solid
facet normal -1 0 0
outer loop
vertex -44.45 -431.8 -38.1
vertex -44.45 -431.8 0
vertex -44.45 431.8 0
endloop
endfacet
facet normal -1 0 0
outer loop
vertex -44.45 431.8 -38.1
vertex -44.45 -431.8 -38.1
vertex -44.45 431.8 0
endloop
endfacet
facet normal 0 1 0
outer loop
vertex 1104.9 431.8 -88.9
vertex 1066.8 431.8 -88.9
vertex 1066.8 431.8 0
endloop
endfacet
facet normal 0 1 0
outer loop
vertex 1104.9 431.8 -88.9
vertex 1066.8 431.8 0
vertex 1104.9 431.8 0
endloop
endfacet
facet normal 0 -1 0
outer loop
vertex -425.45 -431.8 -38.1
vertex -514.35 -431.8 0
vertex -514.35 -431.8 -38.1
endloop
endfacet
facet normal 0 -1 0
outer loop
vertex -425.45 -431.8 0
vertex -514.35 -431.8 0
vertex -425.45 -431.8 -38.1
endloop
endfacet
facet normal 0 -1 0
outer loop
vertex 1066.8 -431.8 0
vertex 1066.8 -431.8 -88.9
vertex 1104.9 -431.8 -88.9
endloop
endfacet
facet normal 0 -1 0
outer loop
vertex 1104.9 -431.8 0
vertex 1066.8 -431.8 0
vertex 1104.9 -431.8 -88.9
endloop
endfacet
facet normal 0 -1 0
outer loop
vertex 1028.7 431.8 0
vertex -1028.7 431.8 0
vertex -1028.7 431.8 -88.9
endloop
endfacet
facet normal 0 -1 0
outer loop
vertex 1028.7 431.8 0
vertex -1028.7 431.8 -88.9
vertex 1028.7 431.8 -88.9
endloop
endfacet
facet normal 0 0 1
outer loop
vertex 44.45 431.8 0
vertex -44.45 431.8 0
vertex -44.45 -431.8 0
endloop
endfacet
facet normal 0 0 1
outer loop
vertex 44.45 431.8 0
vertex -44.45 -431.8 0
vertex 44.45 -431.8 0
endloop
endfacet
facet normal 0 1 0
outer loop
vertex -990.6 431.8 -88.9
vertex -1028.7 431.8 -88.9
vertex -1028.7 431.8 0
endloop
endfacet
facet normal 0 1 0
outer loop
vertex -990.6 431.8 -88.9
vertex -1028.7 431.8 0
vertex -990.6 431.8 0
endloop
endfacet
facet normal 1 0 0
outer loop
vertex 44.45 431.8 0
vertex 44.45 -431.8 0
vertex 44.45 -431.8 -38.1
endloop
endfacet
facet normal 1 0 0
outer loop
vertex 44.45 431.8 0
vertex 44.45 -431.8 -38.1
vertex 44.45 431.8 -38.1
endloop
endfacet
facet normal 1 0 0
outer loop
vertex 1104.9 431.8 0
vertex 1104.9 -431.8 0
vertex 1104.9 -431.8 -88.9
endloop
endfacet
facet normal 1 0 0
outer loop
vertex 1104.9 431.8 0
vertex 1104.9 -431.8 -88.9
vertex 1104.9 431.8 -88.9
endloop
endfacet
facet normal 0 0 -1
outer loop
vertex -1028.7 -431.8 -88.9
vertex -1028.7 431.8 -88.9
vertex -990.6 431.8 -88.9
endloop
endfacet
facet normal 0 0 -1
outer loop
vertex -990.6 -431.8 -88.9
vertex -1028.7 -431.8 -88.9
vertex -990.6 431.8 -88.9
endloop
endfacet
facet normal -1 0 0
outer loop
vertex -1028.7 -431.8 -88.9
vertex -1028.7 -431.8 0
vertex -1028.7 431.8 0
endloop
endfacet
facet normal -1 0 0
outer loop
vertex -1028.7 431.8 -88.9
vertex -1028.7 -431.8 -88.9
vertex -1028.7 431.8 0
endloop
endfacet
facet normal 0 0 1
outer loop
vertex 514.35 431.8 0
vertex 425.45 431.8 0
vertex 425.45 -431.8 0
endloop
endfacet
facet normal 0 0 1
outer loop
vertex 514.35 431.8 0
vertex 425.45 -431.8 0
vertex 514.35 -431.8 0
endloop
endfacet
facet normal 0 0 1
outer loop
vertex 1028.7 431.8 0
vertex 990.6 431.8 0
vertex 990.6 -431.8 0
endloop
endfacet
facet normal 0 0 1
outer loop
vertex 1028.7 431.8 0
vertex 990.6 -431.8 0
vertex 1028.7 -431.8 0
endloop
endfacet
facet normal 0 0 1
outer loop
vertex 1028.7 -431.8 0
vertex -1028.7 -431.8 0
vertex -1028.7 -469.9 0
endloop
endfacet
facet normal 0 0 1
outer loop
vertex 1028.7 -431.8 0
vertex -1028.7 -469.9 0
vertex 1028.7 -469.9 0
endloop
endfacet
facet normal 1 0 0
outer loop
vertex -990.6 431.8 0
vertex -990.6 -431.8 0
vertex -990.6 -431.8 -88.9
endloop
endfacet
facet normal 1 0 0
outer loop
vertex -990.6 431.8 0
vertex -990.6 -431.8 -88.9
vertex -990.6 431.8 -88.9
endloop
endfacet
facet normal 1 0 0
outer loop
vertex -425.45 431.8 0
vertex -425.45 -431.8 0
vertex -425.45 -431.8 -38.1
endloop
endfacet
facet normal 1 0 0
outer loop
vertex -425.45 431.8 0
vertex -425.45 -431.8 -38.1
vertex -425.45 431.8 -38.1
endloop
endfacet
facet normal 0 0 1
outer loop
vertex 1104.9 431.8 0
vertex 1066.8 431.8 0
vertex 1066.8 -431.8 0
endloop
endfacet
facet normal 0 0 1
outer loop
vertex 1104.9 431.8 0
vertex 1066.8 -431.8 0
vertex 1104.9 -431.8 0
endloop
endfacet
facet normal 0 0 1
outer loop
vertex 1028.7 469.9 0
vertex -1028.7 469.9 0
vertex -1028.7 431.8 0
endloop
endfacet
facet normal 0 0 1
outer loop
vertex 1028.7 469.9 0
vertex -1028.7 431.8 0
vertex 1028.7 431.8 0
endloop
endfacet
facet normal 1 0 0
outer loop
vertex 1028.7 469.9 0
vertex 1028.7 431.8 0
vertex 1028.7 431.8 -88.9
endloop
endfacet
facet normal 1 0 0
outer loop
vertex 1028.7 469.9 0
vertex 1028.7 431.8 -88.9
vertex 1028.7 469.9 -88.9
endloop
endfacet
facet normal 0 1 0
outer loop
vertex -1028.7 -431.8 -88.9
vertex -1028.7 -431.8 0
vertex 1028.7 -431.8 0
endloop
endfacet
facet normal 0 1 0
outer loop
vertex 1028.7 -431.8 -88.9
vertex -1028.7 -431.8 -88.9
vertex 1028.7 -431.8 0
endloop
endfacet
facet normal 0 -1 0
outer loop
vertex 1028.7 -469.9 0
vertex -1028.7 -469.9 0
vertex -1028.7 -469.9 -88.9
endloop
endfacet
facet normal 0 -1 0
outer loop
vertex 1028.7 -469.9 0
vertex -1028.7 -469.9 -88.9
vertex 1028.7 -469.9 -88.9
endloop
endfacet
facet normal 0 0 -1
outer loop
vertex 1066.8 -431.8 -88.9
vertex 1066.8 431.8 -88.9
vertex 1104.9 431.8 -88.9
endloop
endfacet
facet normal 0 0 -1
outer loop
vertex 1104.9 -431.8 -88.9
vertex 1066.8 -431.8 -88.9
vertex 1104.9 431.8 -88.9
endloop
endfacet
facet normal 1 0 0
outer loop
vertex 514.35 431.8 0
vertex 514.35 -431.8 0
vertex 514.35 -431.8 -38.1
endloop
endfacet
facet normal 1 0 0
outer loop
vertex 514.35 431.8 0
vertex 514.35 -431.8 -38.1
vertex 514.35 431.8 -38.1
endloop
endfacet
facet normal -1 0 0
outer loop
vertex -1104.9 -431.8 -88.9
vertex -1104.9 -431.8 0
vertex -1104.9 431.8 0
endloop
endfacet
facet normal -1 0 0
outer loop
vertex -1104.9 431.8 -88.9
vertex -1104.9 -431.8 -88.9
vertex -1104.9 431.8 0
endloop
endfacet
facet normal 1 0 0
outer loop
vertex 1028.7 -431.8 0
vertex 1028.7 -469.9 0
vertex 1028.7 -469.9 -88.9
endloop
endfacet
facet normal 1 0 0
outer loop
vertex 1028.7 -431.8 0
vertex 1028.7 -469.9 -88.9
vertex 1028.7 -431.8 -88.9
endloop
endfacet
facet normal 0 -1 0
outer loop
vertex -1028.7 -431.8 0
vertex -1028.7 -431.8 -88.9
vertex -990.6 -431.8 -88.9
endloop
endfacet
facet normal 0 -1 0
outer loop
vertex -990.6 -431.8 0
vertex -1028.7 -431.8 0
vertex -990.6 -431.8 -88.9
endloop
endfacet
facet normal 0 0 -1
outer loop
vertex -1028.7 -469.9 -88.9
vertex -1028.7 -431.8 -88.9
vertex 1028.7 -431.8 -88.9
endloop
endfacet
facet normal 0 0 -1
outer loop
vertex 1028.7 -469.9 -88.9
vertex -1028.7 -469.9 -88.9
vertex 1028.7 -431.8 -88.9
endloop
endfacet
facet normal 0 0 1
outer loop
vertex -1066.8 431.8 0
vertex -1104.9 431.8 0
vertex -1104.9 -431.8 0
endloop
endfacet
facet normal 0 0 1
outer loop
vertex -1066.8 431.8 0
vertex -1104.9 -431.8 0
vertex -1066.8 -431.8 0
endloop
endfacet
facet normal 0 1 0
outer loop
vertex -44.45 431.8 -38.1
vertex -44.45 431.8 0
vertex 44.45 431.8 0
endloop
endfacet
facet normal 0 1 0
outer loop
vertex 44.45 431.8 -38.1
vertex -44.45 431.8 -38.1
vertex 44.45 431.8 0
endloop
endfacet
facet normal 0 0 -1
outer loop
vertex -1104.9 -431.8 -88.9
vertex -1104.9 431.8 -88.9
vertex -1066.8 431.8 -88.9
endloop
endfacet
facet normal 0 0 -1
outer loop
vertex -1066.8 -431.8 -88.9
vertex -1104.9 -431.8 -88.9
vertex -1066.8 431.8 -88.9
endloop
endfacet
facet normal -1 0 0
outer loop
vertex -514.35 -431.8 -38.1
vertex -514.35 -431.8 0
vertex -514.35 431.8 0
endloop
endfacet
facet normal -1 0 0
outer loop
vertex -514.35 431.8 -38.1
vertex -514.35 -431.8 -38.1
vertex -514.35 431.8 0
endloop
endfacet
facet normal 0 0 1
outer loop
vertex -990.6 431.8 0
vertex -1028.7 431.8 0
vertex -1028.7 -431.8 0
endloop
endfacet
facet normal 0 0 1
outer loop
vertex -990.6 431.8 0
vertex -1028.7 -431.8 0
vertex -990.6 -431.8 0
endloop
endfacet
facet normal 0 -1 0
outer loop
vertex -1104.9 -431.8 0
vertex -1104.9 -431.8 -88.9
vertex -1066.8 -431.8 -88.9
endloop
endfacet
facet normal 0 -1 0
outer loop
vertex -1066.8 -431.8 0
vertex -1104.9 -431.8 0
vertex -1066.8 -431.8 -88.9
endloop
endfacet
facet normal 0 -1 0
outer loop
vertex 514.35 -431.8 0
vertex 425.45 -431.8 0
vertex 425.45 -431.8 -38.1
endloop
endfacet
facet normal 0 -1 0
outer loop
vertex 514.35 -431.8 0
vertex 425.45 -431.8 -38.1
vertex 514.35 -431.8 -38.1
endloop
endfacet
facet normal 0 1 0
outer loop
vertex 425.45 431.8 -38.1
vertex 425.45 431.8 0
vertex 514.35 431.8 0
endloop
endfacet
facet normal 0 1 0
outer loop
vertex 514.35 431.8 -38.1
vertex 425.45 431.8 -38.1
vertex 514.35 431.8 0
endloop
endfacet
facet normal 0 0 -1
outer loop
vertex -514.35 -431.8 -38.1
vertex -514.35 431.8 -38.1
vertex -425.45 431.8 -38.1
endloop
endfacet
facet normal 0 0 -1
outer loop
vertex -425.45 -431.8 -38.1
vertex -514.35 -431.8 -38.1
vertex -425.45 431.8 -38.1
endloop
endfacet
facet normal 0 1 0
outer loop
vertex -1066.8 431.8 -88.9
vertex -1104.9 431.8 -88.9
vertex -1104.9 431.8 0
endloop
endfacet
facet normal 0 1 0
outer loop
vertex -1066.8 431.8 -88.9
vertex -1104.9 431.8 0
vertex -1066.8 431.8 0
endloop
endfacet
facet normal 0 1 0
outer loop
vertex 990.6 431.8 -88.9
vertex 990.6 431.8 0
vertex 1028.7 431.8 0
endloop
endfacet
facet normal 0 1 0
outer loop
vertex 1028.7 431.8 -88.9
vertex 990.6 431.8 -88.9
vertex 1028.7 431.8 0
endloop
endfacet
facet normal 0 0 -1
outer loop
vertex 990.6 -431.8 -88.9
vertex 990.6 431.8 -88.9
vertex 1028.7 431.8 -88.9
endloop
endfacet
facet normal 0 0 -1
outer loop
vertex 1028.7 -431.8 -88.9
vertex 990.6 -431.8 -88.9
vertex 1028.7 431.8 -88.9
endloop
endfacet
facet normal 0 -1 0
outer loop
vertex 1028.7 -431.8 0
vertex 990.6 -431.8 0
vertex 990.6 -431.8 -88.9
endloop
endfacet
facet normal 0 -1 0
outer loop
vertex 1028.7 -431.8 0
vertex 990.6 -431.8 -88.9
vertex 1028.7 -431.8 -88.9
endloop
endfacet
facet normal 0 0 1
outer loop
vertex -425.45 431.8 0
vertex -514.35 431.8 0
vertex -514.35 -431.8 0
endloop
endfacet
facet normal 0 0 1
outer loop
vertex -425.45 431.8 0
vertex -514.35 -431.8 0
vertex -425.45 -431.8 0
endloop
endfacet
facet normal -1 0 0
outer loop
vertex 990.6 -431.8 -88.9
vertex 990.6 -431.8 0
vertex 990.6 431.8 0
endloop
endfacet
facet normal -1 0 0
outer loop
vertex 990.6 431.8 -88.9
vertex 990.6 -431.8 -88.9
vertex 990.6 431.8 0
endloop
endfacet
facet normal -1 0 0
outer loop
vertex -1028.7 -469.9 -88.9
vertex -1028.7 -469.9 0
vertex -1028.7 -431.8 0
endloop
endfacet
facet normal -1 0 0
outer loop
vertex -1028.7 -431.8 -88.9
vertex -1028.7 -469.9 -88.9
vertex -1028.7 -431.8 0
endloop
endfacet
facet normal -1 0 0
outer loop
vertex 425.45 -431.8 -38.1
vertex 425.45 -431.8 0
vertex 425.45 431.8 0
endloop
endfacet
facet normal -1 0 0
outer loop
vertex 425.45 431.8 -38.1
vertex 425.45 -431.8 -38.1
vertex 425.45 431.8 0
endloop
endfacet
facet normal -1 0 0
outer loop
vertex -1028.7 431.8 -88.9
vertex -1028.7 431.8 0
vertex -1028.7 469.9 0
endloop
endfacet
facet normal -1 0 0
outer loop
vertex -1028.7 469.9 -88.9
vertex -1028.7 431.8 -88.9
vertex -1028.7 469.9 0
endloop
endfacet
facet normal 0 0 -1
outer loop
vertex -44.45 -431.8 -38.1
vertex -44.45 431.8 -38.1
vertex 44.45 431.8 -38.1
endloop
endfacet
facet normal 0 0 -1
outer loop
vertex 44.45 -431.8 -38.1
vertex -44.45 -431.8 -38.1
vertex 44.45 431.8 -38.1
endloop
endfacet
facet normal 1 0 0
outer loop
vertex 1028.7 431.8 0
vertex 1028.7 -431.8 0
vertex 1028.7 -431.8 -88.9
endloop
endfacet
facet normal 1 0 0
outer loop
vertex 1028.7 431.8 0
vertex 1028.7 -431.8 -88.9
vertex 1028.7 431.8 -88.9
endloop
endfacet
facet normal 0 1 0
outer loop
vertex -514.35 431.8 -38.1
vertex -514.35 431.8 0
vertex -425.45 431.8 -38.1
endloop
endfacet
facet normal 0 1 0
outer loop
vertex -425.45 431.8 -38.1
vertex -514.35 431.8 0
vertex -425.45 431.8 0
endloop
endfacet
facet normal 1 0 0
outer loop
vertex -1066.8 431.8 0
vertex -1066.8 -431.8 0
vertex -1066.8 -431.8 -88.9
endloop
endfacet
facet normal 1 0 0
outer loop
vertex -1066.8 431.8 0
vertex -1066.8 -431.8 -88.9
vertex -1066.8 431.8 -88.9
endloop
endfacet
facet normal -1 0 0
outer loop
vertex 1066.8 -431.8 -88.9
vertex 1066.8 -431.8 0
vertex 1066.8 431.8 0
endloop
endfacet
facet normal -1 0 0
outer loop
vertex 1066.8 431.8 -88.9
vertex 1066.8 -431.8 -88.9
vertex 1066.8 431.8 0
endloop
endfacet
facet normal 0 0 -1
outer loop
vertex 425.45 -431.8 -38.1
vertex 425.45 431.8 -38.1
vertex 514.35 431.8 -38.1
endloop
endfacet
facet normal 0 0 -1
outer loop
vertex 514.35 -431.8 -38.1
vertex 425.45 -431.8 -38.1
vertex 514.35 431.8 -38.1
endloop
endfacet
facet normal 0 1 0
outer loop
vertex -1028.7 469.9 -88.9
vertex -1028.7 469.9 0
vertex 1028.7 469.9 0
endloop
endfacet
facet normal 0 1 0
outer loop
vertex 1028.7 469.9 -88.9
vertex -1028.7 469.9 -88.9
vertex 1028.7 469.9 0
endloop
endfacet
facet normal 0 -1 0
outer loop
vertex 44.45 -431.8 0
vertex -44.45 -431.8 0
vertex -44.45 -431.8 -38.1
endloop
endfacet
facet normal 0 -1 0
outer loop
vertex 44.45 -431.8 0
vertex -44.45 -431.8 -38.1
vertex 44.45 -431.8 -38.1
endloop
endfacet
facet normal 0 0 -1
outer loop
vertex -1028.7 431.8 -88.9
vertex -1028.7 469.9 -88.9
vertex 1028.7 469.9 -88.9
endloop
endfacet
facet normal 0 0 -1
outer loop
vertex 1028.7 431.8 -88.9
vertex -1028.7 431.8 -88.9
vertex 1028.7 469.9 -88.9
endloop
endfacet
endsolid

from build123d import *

# Parameters (mm, degrees)
F0_W      = 88.9
F0_H      = 863.6
F4_DEPTH  = 38.1
F2_W      = 88.9
F2_H      = 863.6
F3_W      = 88.9
F3_H      = 863.6
F10_W     = 2057.4
F10_H     = 38.1
F11_DEPTH = 88.9
F9_W      = 2057.4
F9_H      = 38.1
F8_W      = 38.1
F8_H      = 863.6
F7_W      = 38.1
F7_H      = 863.6
F6_W      = 38.1
F6_H      = 863.6
F5_W      = 38.1
F5_H      = 863.6


with BuildPart() as f4:
    # F0 (on Top) → F4 (new body)
    with BuildSketch(Plane.XY):
        Rectangle(F0_W, F0_H)
    extrude(amount=-F4_DEPTH)


with BuildPart() as f4b:
    # F2 (on Top) → F4, piece 2 (new body)
    with BuildSketch(Plane.XY):
        with Locations((-469.9, 0)):
            Rectangle(F2_W, F2_H)
    extrude(amount=-F4_DEPTH)


with BuildPart() as f4c:
    # F3 (on Top) → F4, piece 3 (new body)
    with BuildSketch(Plane.XY):
        with Locations((469.9, 0)):
            Rectangle(F3_W, F3_H)
    extrude(amount=-F4_DEPTH)


with BuildPart() as f11:
    # F10 (on Top) → F11 (new body)
    with BuildSketch(Plane.XY):
        with Locations((0, -450.85)):
            Rectangle(F10_W, F10_H)
    extrude(amount=-F11_DEPTH)


with BuildPart() as f11b:
    # F9 (on Top) → F11, piece 2 (new body)
    with BuildSketch(Plane.XY):
        with Locations((0, 450.85)):
            Rectangle(F9_W, F9_H)
    extrude(amount=-F11_DEPTH)


with BuildPart() as f11c:
    # F8 (on Top) → F11, piece 3 (new body)
    with BuildSketch(Plane.XY):
        with Locations((1085.85, 0)):
            Rectangle(F8_W, F8_H)
    extrude(amount=-F11_DEPTH)


with BuildPart() as f11d:
    # F7 (on Top) → F11, piece 4 (new body)
    with BuildSketch(Plane.XY):
        with Locations((1009.65, 0)):
            Rectangle(F7_W, F7_H)
    extrude(amount=-F11_DEPTH)


with BuildPart() as f11e:
    # F6 (on Top) → F11, piece 5 (new body)
    with BuildSketch(Plane.XY):
        with Locations((-1085.85, 0)):
            Rectangle(F6_W, F6_H)
    extrude(amount=-F11_DEPTH)


with BuildPart() as f11f:
    # F5 (on Top) → F11, piece 6 (new body)
    with BuildSketch(Plane.XY):
        with Locations((-1009.65, 0)):
            Rectangle(F5_W, F5_H)
    extrude(amount=-F11_DEPTH)


solid = Compound([f4.part, f4b.part, f4c.part, f11.part, f11b.part, f11c.part, f11d.part, f11e.part, f11f.part])
